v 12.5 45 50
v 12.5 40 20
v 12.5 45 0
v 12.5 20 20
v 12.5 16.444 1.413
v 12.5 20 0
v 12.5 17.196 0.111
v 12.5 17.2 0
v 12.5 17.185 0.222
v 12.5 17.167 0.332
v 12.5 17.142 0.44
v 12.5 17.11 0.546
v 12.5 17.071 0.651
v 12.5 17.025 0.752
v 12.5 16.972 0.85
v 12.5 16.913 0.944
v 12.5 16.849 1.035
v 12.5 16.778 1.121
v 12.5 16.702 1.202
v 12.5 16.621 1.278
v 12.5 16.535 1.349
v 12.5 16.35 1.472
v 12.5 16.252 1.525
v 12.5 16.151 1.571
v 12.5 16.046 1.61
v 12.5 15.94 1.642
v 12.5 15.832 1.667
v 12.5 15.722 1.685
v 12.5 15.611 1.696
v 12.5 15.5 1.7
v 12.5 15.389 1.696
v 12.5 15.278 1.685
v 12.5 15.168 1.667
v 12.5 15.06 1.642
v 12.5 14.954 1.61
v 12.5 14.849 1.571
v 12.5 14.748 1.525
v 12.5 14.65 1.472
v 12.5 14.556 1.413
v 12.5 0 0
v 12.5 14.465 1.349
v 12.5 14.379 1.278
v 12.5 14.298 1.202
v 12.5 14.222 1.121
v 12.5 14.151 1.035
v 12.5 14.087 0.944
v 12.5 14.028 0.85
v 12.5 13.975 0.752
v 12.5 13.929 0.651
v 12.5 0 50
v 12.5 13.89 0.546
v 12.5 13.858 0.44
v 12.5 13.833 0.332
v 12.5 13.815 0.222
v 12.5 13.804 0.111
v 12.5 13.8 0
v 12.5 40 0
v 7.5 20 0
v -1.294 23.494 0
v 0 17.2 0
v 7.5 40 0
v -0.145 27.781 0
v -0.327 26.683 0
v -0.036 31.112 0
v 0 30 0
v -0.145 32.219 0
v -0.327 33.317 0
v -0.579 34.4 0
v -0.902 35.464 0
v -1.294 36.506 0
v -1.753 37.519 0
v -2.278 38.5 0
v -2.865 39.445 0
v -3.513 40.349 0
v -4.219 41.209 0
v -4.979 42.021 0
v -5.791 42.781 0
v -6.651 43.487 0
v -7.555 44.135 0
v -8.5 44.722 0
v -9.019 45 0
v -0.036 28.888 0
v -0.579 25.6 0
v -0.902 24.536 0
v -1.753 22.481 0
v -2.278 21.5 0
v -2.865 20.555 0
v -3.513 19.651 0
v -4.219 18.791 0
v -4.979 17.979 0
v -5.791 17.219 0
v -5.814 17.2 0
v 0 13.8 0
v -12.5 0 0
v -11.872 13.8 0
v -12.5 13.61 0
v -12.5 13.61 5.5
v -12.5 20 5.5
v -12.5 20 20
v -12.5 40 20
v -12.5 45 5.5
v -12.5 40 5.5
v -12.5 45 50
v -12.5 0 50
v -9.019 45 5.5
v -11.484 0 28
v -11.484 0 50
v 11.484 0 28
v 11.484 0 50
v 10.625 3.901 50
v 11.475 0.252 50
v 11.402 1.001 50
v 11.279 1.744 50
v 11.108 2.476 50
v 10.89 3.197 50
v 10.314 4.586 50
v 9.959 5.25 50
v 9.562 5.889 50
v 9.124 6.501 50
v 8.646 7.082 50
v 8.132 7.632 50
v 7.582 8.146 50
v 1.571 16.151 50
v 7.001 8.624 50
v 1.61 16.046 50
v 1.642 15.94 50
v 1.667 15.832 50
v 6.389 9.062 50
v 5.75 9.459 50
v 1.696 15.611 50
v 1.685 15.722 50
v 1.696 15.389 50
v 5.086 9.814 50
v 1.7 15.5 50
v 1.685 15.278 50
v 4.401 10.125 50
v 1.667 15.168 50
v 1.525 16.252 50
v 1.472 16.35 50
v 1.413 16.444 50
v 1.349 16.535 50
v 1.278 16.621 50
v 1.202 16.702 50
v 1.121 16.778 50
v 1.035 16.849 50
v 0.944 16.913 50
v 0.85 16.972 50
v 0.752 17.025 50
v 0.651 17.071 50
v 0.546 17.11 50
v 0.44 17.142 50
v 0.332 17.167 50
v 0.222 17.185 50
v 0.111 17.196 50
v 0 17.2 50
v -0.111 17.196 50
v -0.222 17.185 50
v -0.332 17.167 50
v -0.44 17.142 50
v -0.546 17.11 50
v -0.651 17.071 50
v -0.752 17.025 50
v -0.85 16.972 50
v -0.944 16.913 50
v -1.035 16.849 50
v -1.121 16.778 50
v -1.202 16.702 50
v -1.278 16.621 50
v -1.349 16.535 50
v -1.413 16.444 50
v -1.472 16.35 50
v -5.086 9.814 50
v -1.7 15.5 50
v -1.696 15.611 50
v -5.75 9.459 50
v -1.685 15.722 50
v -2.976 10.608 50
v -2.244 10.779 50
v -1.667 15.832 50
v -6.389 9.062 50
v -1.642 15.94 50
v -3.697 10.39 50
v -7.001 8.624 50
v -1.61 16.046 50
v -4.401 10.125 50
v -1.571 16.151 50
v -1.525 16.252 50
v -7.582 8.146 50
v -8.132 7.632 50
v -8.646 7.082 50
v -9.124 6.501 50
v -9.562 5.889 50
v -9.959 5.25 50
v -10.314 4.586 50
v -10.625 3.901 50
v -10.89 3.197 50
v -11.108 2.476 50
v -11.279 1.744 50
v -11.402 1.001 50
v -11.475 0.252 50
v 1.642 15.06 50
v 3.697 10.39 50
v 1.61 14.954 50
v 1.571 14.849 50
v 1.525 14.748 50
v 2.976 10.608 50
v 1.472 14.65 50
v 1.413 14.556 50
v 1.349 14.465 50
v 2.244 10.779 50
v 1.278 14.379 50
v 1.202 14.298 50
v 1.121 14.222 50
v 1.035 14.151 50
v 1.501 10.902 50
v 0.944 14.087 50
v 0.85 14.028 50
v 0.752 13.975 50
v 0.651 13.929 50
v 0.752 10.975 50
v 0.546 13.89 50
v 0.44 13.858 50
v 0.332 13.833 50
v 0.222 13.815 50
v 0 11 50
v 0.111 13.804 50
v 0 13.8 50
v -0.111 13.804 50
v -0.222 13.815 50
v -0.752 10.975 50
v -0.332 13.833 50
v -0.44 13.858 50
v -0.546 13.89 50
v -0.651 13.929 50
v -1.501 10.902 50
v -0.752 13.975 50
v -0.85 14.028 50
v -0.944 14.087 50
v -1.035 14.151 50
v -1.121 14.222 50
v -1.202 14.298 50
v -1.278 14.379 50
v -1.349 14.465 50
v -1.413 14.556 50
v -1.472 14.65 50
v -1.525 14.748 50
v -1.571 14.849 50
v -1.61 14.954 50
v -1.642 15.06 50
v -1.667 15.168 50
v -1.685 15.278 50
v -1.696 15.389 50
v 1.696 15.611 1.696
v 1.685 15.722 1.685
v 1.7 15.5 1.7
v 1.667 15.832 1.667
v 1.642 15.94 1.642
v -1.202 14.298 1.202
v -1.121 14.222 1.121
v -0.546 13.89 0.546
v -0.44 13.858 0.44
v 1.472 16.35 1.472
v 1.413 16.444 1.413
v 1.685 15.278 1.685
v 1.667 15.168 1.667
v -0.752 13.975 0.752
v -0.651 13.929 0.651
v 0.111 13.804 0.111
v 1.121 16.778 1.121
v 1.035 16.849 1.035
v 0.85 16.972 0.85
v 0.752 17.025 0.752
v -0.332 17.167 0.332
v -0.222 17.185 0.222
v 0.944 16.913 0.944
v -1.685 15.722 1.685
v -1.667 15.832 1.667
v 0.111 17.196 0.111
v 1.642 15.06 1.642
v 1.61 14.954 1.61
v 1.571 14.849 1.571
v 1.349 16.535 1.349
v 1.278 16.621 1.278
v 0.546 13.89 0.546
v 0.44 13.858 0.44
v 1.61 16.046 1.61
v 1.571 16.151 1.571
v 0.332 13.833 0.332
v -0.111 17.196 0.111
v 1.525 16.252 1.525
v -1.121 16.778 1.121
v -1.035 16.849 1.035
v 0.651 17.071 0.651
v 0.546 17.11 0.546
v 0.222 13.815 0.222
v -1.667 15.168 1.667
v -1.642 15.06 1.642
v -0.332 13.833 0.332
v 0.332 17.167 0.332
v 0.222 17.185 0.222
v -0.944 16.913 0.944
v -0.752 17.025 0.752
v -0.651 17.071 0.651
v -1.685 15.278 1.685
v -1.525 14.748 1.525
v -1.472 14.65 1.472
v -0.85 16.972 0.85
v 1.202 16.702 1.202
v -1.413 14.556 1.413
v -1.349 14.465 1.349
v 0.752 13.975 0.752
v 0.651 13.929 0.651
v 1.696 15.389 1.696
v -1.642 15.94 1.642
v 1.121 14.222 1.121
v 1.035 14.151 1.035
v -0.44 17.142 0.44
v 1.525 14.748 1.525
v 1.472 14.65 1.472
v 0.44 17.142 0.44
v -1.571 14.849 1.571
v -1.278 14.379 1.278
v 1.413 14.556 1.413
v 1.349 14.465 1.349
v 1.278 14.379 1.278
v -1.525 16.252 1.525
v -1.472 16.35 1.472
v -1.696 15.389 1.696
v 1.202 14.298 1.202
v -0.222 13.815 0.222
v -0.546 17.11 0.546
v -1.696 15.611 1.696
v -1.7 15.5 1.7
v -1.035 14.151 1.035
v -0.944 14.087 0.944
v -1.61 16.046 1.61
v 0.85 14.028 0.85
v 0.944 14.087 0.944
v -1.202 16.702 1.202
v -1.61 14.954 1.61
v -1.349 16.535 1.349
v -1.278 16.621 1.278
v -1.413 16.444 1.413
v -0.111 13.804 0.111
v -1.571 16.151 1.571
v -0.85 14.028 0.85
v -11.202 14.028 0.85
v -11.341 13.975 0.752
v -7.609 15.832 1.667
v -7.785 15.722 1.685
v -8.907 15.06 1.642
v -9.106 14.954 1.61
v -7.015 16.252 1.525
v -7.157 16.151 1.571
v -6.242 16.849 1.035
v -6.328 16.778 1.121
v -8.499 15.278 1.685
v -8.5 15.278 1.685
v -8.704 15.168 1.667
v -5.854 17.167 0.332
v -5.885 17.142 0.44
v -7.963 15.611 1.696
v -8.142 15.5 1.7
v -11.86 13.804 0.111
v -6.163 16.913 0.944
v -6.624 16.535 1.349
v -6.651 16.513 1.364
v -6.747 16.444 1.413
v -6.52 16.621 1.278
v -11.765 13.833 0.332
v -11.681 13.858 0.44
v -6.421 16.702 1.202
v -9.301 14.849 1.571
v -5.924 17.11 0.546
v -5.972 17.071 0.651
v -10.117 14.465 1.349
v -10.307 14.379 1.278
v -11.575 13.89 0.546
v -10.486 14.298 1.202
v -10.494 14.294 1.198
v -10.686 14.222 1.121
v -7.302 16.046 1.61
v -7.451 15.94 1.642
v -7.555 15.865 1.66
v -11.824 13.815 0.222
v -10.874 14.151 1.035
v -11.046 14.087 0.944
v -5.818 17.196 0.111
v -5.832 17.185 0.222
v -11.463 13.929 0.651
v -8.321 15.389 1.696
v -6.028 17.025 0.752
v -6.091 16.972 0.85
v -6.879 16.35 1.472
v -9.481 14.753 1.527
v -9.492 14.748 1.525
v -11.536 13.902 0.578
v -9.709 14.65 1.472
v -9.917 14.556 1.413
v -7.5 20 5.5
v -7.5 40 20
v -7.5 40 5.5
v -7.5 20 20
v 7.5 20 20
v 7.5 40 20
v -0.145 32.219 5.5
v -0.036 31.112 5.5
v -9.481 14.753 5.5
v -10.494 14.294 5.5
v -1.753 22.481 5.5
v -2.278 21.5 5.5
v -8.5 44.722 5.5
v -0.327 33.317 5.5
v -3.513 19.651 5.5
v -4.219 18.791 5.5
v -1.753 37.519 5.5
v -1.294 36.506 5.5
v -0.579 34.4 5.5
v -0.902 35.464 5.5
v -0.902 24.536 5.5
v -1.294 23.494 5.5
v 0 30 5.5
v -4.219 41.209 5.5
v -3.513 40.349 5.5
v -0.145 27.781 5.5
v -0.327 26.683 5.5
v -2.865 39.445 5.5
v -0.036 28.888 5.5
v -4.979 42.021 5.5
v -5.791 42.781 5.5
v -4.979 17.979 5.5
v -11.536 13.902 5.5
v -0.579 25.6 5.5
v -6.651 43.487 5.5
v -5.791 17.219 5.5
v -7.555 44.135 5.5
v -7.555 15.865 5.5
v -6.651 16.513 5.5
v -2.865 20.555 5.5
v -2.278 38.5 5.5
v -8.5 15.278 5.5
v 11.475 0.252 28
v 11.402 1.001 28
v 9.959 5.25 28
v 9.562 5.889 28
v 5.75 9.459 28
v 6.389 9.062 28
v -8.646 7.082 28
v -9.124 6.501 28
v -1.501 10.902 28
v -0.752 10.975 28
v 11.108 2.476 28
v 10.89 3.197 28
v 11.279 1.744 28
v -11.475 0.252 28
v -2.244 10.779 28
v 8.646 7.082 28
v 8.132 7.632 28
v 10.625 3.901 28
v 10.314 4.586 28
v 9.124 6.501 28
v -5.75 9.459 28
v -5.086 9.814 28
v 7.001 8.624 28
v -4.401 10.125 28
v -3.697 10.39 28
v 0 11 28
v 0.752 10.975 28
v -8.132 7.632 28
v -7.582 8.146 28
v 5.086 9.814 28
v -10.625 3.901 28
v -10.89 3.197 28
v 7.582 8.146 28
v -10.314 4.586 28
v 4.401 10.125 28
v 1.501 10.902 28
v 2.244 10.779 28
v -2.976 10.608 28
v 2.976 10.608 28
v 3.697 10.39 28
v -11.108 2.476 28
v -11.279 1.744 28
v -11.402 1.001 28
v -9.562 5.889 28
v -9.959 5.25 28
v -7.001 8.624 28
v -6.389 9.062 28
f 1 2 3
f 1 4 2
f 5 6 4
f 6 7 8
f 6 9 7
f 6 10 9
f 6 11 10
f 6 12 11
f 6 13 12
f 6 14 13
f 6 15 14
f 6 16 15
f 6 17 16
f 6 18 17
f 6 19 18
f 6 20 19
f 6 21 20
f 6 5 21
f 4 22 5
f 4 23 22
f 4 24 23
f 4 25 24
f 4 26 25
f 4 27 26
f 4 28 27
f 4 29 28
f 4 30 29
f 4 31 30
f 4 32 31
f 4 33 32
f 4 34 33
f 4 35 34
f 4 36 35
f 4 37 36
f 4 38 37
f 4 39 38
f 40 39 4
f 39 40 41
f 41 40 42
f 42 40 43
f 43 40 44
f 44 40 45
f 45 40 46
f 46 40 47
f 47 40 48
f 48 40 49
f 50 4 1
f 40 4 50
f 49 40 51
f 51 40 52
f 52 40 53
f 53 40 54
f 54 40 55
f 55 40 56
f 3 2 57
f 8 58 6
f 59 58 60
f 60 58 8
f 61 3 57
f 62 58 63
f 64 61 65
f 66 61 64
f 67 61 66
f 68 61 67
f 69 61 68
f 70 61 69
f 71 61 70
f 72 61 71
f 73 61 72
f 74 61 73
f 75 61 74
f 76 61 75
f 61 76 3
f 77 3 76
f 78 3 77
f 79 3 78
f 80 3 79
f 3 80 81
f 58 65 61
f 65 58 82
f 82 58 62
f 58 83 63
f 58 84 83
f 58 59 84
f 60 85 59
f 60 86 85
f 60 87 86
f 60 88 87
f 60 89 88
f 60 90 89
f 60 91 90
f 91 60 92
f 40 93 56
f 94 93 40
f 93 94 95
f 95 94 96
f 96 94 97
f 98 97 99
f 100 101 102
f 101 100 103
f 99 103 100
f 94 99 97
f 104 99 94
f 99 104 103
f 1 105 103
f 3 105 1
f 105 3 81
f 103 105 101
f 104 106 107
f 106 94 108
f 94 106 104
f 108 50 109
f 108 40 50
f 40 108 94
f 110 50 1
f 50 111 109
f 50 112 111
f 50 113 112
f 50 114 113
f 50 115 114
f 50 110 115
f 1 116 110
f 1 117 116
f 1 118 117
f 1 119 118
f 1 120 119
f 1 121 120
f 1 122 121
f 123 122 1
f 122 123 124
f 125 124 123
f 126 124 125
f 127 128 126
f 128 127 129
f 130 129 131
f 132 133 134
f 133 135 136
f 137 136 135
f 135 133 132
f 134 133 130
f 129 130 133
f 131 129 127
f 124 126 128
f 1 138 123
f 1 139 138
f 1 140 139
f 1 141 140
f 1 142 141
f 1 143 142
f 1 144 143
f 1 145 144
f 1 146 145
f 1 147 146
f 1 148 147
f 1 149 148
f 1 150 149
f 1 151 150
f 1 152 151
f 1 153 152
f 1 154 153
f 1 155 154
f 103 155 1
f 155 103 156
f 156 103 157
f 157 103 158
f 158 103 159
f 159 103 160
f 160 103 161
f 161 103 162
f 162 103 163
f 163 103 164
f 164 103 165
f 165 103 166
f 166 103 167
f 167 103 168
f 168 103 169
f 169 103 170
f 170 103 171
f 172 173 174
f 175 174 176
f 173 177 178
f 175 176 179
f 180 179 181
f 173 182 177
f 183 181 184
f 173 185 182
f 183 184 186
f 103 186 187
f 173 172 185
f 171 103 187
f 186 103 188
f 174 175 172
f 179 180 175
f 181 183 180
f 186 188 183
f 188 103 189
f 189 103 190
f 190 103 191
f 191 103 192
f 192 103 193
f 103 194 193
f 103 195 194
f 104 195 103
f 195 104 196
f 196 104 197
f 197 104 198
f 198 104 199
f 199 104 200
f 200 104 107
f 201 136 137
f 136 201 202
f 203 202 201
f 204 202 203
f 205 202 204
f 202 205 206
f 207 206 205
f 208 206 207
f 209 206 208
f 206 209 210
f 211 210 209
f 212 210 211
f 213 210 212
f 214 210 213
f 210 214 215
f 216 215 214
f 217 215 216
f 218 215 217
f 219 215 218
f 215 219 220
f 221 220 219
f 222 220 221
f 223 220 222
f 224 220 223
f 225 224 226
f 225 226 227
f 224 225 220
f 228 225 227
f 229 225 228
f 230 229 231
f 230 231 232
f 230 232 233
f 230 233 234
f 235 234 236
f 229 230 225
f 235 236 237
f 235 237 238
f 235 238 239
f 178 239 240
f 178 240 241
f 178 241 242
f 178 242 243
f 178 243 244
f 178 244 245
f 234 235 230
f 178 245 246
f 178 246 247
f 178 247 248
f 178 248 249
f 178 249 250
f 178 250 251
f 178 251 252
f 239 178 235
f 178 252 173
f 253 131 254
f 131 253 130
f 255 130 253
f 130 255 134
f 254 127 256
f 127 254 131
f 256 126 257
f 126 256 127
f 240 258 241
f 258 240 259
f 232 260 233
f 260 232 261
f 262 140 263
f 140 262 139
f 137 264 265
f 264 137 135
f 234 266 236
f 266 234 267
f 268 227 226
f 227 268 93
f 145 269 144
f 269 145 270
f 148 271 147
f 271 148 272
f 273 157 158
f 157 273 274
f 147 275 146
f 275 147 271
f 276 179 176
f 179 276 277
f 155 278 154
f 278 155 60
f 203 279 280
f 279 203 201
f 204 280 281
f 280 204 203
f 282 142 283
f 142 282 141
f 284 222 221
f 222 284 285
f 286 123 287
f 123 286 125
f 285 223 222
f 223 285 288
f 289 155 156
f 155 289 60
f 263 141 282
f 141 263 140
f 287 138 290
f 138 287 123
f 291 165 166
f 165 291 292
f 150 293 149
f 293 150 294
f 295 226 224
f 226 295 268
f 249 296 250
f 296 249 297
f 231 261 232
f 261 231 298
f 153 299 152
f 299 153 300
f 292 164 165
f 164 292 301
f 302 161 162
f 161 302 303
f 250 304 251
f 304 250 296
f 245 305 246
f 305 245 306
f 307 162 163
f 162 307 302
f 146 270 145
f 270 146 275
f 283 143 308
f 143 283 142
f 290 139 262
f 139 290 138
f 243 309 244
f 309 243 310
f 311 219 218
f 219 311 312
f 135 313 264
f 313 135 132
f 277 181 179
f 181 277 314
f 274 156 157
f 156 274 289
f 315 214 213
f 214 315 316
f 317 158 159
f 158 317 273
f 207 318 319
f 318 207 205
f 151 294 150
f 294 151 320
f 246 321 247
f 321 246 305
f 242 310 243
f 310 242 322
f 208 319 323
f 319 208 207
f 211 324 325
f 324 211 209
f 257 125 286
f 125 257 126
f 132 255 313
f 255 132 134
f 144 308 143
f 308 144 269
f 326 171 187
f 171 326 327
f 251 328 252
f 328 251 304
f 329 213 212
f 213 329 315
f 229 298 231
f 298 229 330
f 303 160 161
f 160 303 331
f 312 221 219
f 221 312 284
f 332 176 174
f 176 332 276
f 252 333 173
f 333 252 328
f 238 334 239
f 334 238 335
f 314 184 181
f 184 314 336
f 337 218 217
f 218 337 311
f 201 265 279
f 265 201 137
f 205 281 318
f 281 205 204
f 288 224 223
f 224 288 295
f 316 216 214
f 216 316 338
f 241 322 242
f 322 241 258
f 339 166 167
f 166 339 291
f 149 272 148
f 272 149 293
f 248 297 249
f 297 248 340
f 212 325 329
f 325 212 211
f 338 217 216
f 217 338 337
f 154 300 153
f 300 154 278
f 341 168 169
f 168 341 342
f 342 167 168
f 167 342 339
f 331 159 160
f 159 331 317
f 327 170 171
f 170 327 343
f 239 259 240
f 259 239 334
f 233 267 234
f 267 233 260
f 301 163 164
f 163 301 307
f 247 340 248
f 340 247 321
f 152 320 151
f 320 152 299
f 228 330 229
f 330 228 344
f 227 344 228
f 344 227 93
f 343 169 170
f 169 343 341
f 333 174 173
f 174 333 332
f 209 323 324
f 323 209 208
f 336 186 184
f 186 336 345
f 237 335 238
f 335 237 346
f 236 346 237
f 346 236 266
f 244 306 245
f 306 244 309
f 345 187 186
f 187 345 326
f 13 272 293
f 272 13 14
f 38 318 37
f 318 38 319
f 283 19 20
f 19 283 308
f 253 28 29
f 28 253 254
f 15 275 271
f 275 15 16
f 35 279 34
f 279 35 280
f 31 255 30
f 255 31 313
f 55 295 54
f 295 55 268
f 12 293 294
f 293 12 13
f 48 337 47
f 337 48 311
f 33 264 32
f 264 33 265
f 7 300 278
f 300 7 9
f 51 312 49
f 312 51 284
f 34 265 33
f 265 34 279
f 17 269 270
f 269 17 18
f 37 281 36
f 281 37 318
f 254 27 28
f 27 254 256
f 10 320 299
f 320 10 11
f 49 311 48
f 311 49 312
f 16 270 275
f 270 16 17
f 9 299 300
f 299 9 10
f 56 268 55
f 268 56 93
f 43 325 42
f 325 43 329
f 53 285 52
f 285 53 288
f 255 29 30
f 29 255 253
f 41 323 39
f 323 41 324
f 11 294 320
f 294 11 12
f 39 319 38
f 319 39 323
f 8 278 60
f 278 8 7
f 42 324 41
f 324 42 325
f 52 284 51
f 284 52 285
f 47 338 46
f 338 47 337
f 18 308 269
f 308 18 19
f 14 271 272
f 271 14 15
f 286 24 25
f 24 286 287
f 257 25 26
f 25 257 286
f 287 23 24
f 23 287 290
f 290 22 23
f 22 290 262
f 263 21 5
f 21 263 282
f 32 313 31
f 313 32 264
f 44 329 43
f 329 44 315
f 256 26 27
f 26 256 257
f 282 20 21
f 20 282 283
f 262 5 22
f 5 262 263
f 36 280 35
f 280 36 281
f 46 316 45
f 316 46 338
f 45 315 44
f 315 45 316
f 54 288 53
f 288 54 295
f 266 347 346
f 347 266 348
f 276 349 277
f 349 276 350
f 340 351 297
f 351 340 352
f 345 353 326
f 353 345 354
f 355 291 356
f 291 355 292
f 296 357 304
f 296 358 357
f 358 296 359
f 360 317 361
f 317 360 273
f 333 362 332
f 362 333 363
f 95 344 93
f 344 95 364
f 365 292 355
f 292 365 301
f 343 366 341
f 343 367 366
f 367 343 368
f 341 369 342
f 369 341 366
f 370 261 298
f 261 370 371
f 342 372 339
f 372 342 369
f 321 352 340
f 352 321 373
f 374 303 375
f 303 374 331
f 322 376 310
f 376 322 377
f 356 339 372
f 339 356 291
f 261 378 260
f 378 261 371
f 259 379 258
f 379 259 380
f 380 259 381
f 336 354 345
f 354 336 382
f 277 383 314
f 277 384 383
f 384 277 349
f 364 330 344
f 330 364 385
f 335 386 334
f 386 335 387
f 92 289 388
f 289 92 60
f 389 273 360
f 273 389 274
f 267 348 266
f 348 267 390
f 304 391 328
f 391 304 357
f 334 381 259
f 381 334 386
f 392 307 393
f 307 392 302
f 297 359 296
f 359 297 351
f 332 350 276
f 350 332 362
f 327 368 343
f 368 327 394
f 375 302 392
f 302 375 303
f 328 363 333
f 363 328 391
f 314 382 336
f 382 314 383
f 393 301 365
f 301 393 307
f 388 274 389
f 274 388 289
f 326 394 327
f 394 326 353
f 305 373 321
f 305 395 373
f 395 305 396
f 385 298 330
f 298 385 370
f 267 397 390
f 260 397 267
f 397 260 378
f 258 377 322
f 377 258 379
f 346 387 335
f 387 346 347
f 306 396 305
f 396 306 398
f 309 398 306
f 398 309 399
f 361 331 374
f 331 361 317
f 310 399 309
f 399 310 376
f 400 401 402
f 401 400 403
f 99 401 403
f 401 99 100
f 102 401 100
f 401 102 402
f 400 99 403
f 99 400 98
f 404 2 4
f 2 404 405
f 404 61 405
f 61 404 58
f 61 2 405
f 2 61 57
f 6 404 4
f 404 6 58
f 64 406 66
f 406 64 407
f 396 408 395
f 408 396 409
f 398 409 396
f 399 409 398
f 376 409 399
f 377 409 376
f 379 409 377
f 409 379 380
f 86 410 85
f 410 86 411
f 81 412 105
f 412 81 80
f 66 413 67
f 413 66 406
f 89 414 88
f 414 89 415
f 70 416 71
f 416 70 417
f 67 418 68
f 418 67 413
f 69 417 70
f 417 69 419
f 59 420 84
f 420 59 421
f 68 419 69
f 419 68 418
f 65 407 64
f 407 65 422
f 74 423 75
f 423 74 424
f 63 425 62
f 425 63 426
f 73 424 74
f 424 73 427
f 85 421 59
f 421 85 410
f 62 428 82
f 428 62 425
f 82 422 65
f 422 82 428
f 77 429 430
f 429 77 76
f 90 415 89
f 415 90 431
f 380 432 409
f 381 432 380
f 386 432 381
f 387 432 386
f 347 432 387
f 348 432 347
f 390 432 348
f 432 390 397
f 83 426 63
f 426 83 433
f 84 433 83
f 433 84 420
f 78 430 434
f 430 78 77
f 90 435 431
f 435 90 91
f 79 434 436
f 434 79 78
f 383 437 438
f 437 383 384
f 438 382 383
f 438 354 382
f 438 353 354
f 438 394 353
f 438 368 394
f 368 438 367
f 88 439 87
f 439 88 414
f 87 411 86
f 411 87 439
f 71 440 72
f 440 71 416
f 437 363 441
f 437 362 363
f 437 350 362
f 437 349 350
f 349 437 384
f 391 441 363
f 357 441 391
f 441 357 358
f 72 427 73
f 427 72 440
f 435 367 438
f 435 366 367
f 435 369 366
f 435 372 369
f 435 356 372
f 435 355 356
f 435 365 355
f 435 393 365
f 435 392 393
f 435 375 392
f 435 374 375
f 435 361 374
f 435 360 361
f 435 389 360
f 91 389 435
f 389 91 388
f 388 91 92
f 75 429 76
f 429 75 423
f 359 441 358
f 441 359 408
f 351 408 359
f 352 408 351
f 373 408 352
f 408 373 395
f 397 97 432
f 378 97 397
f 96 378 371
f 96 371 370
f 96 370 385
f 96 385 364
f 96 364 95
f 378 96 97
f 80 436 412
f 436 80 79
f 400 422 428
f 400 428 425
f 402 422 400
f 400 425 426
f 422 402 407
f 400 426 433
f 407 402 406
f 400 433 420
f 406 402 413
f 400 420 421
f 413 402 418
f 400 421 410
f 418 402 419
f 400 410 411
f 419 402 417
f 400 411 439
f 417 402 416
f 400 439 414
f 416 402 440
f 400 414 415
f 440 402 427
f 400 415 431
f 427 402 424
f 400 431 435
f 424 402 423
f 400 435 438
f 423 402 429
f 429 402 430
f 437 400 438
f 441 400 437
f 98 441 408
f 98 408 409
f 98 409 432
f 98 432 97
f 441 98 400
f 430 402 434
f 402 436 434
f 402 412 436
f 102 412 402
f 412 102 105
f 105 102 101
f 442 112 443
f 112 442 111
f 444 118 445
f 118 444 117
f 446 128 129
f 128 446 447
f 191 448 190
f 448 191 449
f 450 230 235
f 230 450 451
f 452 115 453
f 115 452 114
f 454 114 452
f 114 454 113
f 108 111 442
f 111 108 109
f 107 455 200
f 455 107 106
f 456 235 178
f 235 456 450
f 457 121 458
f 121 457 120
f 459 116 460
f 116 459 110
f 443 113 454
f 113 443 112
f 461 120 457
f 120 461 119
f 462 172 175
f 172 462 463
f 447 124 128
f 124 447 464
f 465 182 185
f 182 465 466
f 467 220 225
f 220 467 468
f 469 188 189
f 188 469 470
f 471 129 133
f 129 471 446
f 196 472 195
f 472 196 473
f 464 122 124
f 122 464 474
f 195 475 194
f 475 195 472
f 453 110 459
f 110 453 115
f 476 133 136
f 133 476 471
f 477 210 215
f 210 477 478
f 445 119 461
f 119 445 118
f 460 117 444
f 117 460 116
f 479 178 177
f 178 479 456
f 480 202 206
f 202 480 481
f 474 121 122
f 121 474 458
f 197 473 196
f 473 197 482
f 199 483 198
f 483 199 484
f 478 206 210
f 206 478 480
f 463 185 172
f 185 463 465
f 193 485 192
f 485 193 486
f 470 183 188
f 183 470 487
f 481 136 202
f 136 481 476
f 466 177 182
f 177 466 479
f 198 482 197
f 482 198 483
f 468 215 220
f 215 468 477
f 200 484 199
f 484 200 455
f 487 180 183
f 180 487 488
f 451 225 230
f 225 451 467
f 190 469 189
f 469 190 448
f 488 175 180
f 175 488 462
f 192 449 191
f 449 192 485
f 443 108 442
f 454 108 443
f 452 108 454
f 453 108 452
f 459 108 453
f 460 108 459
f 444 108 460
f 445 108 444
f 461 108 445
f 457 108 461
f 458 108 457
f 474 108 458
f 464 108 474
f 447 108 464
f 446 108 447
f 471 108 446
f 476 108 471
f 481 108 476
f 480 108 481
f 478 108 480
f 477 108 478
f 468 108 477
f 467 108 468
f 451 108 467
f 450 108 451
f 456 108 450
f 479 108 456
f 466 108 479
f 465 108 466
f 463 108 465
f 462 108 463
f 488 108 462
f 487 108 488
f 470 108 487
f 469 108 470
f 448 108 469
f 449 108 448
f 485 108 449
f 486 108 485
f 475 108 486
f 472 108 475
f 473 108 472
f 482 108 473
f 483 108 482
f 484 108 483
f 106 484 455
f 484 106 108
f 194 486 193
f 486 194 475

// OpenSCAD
// NEMA 17 stepper motor L-shaped mounting bracket
// Print orientation: base plate on the bed, vertical plate builds upward (+Z)

// ---------------- Parameters ----------------
plate_x      = 25;    // base plate length along X (mm)
plate_y      = 45;    // base plate width along Y (mm)
plate_t      = 5;     // base plate thickness along Z (mm)

hole_m4_x    = 17;    // M4 through-hole X offset from centre (mm)
hole_m4_y    = 30;    // M4 through-hole Y position (mm)

plate_z      = 50;    // vertical motor plate height (mm)
boss_d       = 23;    // motor centring boss hole diameter (mm)
boss_z       = 28;    // motor centring boss hole Z position (mm)

screw_d      = 3.4;   // M3 screw hole diameter (mm)
screw_pitch  = 31;    // M3 screw hole square pattern size (mm)

gusset_t     = 5;     // gusset thickness along X (mm)
gusset_leg   = 20;    // gusset leg length along Y and Z (mm)

eps          = 0.5;   // cutter overshoot past faces (mm)
$fn          = 96;    // curve resolution

// ---------------- Model ----------------
difference() {
    union() {
        // Base plate
        translate([-plate_x/2, 0, 0])
            cube([plate_x, plate_y, plate_t]);

        // Vertical motor plate
        translate([-plate_x/2, 0, 0])
            cube([plate_x, plate_y, plate_z]);
    }

    // Base plate through-holes (M4)
    translate([-hole_m4_x, hole_m4_y, -eps])
        cylinder(d = hole_m4_x * 2, h = plate_t + 2 * eps);

    // Motor centring boss hole (through vertical plate, along Y)
    translate([0, -eps, boss_z])
        cylinder(d = boss_d, h = plate_y + 2 * eps);

    // M3 screw holes on square pattern, centred on boss hole
    for (i = [0 : 3])
        rotate([0, 90 * i, 0])
            translate([0, screw_pitch/2, 0])
                cylinder(d = screw_d, h = plate_z + eps);

    // Gussets, flush with left and right edges
    for (sx = [-1, 1])
        translate([sx > 0 ? plate_x/2 - gusset_t : -plate_x/2, 0, 0])
            translate([0, gusset_leg, 0])
                cube([gusset_t, gusset_leg, gusset_leg]);
}
